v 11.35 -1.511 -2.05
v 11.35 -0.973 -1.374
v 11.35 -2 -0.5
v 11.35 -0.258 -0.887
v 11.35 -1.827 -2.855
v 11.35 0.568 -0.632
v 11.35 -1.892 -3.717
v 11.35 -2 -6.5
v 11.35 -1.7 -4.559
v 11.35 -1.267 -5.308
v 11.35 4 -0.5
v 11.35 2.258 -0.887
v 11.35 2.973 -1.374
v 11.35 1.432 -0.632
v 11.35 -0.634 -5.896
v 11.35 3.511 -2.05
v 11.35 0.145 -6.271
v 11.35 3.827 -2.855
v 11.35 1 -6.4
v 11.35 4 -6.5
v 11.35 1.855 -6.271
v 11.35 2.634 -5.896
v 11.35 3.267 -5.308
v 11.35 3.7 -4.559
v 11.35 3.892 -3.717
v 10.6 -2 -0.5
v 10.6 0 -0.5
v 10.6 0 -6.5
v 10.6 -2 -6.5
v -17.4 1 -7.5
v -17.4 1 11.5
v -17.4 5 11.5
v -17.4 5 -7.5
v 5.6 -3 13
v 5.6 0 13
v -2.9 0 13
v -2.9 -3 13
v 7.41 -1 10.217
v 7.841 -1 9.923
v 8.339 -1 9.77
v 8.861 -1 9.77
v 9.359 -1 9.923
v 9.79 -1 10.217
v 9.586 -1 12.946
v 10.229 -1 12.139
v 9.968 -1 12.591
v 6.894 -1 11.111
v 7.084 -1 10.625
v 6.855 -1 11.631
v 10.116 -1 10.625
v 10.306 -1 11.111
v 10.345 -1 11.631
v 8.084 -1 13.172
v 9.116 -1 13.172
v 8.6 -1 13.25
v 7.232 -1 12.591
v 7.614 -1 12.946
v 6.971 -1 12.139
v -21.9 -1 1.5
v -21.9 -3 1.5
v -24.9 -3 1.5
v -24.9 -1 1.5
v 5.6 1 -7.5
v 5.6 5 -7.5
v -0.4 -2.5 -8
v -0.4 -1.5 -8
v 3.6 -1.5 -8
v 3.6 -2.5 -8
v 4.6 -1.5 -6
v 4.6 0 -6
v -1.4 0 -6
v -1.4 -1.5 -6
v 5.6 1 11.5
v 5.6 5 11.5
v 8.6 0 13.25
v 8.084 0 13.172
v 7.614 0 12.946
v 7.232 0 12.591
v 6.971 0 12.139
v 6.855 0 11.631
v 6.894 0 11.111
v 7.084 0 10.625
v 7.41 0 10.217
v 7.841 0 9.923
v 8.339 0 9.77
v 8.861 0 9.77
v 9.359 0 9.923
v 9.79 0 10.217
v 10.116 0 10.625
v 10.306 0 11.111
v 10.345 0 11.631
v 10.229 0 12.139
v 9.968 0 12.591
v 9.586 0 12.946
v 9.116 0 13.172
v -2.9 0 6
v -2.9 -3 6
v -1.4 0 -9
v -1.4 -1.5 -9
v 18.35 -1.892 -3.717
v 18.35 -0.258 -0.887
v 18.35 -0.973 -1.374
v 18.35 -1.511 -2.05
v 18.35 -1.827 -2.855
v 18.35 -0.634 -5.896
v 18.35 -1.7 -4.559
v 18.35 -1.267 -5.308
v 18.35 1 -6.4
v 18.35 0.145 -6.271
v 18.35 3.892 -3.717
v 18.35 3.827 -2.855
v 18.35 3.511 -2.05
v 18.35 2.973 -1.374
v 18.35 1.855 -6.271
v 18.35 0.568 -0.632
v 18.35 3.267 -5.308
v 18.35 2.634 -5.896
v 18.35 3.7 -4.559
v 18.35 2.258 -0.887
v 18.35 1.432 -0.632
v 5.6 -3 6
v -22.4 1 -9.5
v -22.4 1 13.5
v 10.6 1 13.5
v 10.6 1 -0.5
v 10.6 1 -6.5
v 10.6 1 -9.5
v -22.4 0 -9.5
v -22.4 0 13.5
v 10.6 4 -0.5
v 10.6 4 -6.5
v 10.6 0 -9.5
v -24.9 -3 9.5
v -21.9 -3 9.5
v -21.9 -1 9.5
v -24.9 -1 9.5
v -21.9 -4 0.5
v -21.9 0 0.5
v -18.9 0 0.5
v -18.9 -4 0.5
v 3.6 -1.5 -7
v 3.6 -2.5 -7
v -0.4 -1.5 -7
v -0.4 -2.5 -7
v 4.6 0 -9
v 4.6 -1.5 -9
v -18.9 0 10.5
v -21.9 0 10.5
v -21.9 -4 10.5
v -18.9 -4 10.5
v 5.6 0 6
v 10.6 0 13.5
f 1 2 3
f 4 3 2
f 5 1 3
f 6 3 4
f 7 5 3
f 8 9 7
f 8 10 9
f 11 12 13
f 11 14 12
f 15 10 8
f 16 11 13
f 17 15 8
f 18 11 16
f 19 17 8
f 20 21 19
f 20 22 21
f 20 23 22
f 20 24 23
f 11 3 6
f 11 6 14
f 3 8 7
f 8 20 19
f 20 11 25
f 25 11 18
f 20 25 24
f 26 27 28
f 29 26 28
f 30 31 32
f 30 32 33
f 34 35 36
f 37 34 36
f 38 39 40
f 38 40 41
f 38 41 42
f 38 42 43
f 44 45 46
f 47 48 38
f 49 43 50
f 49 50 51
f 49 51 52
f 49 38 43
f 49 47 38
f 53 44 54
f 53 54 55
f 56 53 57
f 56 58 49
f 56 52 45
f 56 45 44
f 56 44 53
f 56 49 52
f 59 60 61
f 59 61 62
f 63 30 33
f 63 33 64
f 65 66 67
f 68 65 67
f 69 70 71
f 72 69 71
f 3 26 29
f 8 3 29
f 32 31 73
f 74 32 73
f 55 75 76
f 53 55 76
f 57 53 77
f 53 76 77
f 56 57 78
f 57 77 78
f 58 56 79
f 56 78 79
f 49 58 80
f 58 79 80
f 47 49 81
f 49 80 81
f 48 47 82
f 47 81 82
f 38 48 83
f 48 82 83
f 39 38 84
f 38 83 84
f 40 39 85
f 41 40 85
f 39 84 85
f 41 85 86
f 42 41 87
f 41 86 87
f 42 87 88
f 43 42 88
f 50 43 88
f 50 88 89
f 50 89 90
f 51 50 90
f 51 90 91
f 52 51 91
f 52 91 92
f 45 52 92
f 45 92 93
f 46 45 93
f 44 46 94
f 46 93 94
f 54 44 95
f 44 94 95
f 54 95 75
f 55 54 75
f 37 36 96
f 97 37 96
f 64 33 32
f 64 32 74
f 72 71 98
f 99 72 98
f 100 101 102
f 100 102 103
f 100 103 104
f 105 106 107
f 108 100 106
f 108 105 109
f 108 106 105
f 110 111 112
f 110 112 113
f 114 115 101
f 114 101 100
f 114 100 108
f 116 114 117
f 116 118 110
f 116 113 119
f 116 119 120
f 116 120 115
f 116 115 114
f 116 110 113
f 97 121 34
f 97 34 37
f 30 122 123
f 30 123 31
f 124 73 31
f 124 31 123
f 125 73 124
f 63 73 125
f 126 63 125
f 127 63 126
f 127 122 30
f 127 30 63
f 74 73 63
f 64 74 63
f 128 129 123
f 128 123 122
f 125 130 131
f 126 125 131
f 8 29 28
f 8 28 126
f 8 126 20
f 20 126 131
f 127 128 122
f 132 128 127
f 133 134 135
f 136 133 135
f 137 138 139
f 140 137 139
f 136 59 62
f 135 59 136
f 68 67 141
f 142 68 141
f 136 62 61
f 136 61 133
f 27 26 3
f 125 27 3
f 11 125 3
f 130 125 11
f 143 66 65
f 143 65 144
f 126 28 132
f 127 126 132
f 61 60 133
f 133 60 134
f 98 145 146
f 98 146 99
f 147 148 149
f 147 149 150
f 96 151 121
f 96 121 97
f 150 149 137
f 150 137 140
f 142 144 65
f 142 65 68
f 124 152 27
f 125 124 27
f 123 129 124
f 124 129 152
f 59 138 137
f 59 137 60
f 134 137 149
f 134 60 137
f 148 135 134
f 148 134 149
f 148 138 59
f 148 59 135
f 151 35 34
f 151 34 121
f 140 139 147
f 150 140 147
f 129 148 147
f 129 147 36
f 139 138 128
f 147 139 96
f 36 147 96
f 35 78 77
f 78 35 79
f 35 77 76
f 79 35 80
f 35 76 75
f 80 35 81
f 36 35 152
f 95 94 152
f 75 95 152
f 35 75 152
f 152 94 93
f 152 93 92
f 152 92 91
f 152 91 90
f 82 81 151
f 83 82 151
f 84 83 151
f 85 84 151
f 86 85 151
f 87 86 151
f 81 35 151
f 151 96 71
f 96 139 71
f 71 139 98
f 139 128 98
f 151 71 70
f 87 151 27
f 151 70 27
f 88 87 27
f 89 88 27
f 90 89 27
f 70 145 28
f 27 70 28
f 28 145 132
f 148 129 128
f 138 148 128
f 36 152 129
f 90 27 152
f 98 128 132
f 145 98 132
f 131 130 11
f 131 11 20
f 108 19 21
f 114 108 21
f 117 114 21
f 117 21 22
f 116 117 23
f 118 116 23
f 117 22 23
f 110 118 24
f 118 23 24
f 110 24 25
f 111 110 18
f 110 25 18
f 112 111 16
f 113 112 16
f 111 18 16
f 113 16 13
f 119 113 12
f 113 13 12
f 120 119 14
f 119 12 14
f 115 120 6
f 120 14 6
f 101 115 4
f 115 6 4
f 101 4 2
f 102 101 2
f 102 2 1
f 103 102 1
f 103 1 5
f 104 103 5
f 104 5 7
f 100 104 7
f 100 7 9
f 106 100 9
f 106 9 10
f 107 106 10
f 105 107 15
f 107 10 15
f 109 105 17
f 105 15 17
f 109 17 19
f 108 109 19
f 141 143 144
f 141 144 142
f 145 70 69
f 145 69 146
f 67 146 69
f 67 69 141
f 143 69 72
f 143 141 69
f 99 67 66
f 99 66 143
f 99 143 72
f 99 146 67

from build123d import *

# Parameters (mm, degrees)
SKETCH1_W            = 33
SKETCH1_H            = 23
BOSS_EXTRUDE1_DEPTH  = 1
SKETCH2_W            = 23
SKETCH2_H            = 19
BOSS_EXTRUDE2_DEPTH  = 4
SKETCH3_W            = 8.5
SKETCH3_H            = 7
BOSS_EXTRUDE4_DEPTH  = 3
SKETCH4_R            = 1.75
BOSS_EXTRUDE5_DEPTH  = 1
SKETCH5_W            = 6
SKETCH5_H            = 6
BOSS_EXTRUDE6_DEPTH  = 0.75
SKETCH6_R            = 2.9
BOSS_EXTRUDE7_DEPTH  = 7
SKETCH7_W            = 6
SKETCH7_H            = 3
BOSS_EXTRUDE8_DEPTH  = 1.5
SKETCH8_W            = 4
SKETCH8_H            = 1
BOSS_EXTRUDE9_DEPTH  = 1
SKETCH9_W            = 3
SKETCH9_H            = 10
BOSS_EXTRUDE10_DEPTH = 4
SKETCH10_W           = 8
SKETCH10_H           = 2
BOSS_EXTRUDE11_DEPTH = 3


with BuildPart() as part:
    # Sketch1 → Boss-Extrude1 (new body)
    with BuildSketch(Plane(origin=(0, 0, 0), x_dir=(1, 0, 0), z_dir=(0, 1, 0))):
        with Locations((-5.9, -2)):
            Rectangle(SKETCH1_W, SKETCH1_H)
    extrude(amount=BOSS_EXTRUDE1_DEPTH)

    # Sketch2 → Boss-Extrude2 (add)
    with BuildSketch(Plane(origin=(0, 1, 0), x_dir=(1, 0, 0), z_dir=(0, 1, 0))):
        with Locations((-5.9, -2)):
            Rectangle(SKETCH2_W, SKETCH2_H)
    extrude(amount=BOSS_EXTRUDE2_DEPTH)

    # Sketch3 → Boss-Extrude4 (add)
    with BuildSketch(Plane(origin=(0, 0, 0), x_dir=(-1, 0, 0), z_dir=(0, -1, 0))):
        with Locations((-1.35, -9.5)):
            Rectangle(SKETCH3_W, SKETCH3_H)
    extrude(amount=BOSS_EXTRUDE4_DEPTH)

    # Sketch4 → Boss-Extrude5 (add)
    with BuildSketch(Plane.XZ):
        with Locations(Location((8.6, 11.5, 0), (0, 0, 90))):
            Circle(SKETCH4_R)
    extrude(amount=BOSS_EXTRUDE5_DEPTH)

    # Sketch5 → Boss-Extrude6 (add)
    with BuildSketch(Plane(origin=(10.6, 0, 0), x_dir=(0, 0, -1), z_dir=(1, 0, 0))):
        with Locations((3.5, 1)):
            Rectangle(SKETCH5_W, SKETCH5_H)
    extrude(amount=BOSS_EXTRUDE6_DEPTH)

    # Sketch6 → Boss-Extrude7 (add)
    with BuildSketch(Plane(origin=(11.35, 0, 0), x_dir=(0, 0, -1), z_dir=(1, 0, 0))):
        with Locations((3.5, 1)):
            Circle(SKETCH6_R)
    extrude(amount=BOSS_EXTRUDE7_DEPTH)

    # Sketch7 → Boss-Extrude8 (add)
    with BuildSketch(Plane(origin=(0, 0, 0), x_dir=(-1, 0, 0), z_dir=(0, -1, 0))):
        with Locations((-1.6, 7.5)):
            Rectangle(SKETCH7_W, SKETCH7_H)
    extrude(amount=BOSS_EXTRUDE8_DEPTH)

    # Sketch8 → Boss-Extrude9 (add)
    with BuildSketch(Plane.XZ.offset(1.5)):
        with Locations((1.6, -7.5)):
            Rectangle(SKETCH8_W, SKETCH8_H)
    extrude(amount=BOSS_EXTRUDE9_DEPTH)

    # Sketch9 → Boss-Extrude10 (add)
    with BuildSketch(Plane.XZ):
        with Locations((-20.4, 5.5)):
            Rectangle(SKETCH9_W, SKETCH9_H)
    extrude(amount=BOSS_EXTRUDE10_DEPTH)

    # Sketch10 → Boss-Extrude11 (add)
    with BuildSketch(Plane.ZY.offset(21.9)):
        with Locations((5.5, -2)):
            Rectangle(SKETCH10_W, SKETCH10_H)
    extrude(amount=BOSS_EXTRUDE11_DEPTH)


solid = part.part
